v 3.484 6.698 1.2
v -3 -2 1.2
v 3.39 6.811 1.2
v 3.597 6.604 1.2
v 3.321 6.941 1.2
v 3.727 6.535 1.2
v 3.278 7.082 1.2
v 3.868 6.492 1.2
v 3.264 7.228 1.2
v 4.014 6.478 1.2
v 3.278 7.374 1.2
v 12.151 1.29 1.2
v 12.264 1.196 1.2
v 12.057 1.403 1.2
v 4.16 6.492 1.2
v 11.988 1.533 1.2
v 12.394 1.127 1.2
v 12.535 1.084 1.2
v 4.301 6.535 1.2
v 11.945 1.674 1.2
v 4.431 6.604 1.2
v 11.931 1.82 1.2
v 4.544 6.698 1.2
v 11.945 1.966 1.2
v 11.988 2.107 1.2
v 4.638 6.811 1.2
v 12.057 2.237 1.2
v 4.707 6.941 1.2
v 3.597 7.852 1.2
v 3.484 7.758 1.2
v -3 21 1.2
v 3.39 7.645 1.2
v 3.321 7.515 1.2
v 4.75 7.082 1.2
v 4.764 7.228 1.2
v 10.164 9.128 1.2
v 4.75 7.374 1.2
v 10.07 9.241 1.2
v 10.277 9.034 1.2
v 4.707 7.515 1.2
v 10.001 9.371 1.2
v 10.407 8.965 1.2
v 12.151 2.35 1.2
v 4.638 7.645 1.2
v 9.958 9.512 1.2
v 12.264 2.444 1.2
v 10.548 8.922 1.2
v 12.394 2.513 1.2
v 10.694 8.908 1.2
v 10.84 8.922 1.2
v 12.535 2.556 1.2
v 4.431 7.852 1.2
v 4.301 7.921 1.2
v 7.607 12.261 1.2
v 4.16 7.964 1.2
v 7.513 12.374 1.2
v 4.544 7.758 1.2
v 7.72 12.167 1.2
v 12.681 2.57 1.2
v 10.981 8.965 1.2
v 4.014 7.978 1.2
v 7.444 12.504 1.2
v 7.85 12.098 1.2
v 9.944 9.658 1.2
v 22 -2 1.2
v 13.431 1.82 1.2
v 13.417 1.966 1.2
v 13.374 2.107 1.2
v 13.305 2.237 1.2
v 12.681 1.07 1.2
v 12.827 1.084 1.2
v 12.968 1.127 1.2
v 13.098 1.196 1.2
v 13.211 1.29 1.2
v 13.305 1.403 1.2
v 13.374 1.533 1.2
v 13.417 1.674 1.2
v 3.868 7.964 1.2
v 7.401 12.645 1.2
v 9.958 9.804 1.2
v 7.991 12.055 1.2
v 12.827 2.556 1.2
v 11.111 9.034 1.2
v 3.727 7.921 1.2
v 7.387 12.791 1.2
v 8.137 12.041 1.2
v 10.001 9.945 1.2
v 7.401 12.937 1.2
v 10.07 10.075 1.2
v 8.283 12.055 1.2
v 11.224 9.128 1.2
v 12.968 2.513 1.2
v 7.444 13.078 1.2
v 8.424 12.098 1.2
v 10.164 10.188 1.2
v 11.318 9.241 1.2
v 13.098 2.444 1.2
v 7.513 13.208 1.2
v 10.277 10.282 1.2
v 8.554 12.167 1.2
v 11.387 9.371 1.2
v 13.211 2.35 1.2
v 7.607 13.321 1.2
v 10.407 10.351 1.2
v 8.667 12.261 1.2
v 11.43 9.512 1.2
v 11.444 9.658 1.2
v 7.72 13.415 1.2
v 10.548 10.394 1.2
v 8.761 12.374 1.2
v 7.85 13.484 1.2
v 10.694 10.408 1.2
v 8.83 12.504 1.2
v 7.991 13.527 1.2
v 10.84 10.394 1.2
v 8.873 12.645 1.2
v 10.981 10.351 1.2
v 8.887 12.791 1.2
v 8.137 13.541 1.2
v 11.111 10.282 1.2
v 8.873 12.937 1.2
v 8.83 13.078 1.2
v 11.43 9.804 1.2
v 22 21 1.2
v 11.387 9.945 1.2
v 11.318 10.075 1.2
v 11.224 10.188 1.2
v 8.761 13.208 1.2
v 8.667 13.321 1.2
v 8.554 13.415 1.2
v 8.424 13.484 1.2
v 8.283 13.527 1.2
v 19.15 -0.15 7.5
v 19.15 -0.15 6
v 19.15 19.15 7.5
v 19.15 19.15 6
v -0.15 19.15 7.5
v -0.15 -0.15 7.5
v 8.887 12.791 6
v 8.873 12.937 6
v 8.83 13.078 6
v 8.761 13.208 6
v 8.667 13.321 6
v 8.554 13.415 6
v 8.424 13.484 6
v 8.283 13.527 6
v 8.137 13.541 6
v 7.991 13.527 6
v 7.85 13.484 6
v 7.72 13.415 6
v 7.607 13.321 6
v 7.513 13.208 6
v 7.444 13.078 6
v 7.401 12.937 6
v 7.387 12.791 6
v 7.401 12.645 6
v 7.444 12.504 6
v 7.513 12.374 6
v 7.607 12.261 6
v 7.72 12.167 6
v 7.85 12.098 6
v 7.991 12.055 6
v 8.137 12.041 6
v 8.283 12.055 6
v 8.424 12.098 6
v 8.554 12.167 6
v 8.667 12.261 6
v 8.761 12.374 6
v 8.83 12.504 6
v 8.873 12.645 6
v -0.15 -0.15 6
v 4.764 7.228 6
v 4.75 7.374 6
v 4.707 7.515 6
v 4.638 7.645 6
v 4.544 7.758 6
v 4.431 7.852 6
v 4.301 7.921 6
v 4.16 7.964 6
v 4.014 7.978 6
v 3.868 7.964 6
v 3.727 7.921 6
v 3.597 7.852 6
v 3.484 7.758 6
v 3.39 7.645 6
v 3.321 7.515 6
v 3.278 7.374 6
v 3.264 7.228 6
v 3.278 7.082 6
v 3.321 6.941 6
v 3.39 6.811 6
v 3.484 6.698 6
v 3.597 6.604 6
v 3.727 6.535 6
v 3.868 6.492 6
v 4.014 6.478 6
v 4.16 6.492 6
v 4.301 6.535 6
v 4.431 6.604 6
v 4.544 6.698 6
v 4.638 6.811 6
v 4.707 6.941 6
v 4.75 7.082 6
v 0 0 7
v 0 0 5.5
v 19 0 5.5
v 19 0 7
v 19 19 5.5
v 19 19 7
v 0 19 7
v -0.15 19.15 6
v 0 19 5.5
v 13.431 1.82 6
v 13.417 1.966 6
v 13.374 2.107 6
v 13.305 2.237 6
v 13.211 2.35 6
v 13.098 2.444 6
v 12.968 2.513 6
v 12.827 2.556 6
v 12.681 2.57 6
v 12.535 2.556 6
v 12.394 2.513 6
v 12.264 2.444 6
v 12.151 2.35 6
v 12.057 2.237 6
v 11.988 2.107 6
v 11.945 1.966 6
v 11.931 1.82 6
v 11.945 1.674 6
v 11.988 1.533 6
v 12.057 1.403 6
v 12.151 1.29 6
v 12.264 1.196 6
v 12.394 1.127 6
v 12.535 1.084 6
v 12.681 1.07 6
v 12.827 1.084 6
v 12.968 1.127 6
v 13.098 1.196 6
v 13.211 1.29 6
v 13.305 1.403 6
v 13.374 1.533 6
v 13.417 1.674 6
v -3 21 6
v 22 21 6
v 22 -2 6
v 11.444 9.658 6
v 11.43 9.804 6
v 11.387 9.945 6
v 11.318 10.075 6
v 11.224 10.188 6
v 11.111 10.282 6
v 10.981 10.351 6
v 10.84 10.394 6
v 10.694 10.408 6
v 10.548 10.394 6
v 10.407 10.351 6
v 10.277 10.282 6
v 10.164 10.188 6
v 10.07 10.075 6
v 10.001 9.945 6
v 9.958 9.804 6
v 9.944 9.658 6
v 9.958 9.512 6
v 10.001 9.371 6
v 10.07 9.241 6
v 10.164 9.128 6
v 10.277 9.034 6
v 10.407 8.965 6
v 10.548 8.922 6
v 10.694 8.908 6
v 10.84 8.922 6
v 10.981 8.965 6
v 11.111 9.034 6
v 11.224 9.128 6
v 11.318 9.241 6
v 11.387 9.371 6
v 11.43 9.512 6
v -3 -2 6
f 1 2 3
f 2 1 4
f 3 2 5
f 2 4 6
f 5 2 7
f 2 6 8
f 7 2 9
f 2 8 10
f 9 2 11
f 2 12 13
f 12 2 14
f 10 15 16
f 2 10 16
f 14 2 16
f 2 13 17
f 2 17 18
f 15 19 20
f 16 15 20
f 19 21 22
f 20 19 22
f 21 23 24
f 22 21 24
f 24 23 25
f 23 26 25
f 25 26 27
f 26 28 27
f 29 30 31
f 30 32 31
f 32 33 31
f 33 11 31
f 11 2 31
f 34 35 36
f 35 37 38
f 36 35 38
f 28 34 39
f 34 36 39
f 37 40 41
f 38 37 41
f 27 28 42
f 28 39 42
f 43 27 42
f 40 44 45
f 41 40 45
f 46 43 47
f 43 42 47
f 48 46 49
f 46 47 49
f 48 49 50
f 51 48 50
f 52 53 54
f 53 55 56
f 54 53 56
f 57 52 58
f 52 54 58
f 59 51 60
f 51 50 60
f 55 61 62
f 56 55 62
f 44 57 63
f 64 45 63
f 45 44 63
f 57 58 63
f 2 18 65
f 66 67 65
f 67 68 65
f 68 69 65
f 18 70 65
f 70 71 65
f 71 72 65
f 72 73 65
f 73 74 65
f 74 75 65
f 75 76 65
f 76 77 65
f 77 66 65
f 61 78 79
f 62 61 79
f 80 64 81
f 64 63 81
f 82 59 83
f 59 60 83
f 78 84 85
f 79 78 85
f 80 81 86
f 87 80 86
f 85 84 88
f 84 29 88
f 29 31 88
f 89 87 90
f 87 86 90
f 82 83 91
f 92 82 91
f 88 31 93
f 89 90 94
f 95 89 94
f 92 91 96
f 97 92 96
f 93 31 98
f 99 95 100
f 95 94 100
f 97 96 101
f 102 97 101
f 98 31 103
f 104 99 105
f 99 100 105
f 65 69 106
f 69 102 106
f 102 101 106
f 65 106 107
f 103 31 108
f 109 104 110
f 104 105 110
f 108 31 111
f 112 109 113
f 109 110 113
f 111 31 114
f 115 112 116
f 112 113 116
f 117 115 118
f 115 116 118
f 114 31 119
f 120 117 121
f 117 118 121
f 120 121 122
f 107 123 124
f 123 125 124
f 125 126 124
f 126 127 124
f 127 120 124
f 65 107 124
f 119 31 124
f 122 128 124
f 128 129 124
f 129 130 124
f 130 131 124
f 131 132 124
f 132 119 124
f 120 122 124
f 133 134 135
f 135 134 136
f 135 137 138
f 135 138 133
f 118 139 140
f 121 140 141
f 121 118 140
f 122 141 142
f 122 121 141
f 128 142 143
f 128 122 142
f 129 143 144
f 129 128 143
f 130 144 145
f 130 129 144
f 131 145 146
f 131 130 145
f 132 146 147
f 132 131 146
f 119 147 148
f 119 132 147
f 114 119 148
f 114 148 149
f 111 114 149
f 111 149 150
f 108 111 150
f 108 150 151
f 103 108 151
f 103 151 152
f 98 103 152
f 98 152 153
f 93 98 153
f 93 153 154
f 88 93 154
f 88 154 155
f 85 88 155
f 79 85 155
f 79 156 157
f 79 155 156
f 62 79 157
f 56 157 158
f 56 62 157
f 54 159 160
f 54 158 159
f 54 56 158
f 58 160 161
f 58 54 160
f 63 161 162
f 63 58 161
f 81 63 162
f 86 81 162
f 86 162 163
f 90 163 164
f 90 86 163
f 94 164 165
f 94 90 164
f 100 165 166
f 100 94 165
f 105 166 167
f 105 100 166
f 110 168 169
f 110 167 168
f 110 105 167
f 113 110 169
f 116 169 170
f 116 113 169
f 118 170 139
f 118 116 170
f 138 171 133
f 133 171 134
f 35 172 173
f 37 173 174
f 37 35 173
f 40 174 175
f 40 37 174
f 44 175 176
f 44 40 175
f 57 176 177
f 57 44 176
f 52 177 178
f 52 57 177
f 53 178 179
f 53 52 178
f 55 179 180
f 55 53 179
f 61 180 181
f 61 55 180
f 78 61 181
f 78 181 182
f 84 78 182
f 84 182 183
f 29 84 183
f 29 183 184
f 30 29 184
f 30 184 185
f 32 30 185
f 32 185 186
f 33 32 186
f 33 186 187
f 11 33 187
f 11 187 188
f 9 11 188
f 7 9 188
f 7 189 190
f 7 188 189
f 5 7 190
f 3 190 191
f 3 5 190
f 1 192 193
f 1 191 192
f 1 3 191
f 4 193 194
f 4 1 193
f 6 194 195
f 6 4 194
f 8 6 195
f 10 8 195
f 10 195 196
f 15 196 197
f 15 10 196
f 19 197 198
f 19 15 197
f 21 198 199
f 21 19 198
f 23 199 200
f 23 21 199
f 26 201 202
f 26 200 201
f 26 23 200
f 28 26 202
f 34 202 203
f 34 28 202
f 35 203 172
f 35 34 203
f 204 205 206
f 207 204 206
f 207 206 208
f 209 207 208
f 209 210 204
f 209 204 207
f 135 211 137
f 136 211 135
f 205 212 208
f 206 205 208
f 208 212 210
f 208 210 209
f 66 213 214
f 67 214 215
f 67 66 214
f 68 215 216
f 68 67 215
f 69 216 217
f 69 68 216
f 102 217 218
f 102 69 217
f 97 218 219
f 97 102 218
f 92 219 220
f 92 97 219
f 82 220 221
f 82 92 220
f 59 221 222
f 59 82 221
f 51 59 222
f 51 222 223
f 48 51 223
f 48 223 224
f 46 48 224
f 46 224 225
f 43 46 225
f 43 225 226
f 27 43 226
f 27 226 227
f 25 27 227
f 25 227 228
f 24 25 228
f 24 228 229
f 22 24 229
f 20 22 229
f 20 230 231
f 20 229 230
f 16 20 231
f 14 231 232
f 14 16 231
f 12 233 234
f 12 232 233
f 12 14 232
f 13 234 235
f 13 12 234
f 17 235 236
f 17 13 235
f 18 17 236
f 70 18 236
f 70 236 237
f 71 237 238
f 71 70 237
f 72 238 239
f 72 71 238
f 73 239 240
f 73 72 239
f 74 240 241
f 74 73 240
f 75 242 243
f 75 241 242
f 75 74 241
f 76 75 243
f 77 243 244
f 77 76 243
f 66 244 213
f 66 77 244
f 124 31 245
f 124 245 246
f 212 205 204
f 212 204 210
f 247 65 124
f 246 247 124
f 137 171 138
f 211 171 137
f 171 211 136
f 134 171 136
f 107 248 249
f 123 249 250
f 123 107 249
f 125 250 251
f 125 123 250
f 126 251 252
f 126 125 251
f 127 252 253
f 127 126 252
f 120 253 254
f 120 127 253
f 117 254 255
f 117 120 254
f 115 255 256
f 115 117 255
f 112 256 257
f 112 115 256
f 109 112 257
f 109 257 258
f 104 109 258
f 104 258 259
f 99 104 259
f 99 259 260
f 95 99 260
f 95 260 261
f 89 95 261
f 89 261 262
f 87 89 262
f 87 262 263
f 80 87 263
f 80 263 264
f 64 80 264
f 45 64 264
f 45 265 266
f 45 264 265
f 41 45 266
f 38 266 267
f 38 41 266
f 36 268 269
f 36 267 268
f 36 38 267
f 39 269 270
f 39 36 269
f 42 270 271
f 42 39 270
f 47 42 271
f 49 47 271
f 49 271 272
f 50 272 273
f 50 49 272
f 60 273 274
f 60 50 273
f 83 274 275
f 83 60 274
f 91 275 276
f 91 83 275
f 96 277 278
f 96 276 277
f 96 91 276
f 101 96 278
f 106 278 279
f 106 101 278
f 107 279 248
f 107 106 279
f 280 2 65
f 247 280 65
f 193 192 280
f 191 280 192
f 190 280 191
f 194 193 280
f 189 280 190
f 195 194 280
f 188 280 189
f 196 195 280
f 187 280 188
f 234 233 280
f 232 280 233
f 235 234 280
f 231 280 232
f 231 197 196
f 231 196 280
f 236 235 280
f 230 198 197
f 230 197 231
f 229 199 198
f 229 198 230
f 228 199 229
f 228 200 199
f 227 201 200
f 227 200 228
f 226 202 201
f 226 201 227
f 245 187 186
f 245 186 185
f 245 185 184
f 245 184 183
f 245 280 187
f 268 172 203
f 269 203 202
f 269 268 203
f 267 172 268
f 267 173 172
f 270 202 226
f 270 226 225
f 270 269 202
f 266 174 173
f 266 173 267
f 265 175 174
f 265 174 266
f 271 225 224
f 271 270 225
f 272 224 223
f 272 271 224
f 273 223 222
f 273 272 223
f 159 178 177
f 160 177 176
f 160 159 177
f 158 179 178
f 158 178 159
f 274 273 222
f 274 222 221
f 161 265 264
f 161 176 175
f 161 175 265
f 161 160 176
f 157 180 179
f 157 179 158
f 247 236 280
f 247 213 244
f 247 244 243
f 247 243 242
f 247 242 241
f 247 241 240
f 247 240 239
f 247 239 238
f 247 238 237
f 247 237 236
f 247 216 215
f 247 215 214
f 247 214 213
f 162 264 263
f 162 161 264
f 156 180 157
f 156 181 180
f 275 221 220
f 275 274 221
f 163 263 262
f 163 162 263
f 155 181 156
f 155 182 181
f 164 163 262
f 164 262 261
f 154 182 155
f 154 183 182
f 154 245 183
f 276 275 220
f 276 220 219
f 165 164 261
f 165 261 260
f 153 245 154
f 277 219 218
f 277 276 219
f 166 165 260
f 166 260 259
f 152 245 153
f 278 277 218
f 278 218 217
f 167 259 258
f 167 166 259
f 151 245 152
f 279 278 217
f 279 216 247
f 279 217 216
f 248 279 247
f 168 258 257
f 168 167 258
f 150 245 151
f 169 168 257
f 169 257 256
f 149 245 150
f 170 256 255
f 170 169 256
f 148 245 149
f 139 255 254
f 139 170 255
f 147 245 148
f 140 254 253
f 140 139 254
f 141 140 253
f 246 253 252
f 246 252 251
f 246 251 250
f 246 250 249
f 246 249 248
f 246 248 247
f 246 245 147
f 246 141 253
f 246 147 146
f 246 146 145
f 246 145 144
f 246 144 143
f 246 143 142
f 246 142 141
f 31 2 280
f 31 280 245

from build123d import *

# Parameters (mm, degrees)
BOX_W             = 19
BOX_H             = 19
BOX_DEPTH         = 1.5
BOX001_W          = 19.3
BOX001_H          = 19.3
BOX001_DEPTH      = 1.5
CYLINDER003_R     = 0.75
CYLINDER003_DEPTH = 5.8
CYLINDER001_R     = 0.75
CYLINDER001_DEPTH = 5.8
CYLINDER002_R     = 0.75
CYLINDER002_DEPTH = 5.8
CYLINDER_R        = 0.75
CYLINDER_DEPTH    = 5.8
BOX002_W          = 25
BOX002_H          = 23
BOX002_DEPTH      = 4.8


with BuildPart() as board:
    # Box → Box (new body)
    with BuildSketch(Plane.XY.offset(5.5)):
        with Locations((9.5, 9.5)):
            Rectangle(BOX_W, BOX_H)
    extrude(amount=BOX_DEPTH)


with BuildPart() as board_hole:
    # Box001 → Box001 (new body)
    with BuildSketch(Plane(origin=(-0.15, -0.15, 6), x_dir=(1, 0, 0), z_dir=(0, 0, 1))):
        with Locations((9.65, 9.65)):
            Rectangle(BOX001_W, BOX001_H)
    extrude(amount=BOX001_DEPTH)


with BuildPart() as cylinder003:
    # Cylinder003 → Cylinder003 (new body)
    with BuildSketch(Plane(origin=(12.681, 1.82, 1.2), x_dir=(1, 0, 0), z_dir=(0, 0, 1))):
        Circle(CYLINDER003_R)
    extrude(amount=CYLINDER003_DEPTH)


with BuildPart() as cylinder001:
    # Cylinder001 → Cylinder001 (new body)
    with BuildSketch(Plane(origin=(10.694, 9.658, 1.2), x_dir=(1, 0, 0), z_dir=(0, 0, 1))):
        Circle(CYLINDER001_R)
    extrude(amount=CYLINDER001_DEPTH)


with BuildPart() as cylinder002:
    # Cylinder002 → Cylinder002 (new body)
    with BuildSketch(Plane(origin=(4.014, 7.228, 1.2), x_dir=(1, 0, 0), z_dir=(0, 0, 1))):
        Circle(CYLINDER002_R)
    extrude(amount=CYLINDER002_DEPTH)


with BuildPart() as fusion:
    # Cylinder → Cylinder (new body)
    with BuildSketch(Plane(origin=(8.137, 12.791, 1.2), x_dir=(1, 0, 0), z_dir=(0, 0, 1))):
        Circle(CYLINDER_R)
    extrude(amount=CYLINDER_DEPTH)

    # Fusion: union Cylinder003, Cylinder001, Cylinder002
    add(cylinder003.part)
    add(cylinder001.part)
    add(cylinder002.part)


with BuildPart() as cut:
    # Box002 → Box002 (new body)
    with BuildSketch(Plane(origin=(-3, -2, 1.2), x_dir=(1, 0, 0), z_dir=(0, 0, 1))):
        with Locations((12.5, 11.5)):
            Rectangle(BOX002_W, BOX002_H)
    extrude(amount=BOX002_DEPTH)

    # Cut: cut Fusion
    add(fusion.part, mode=Mode.SUBTRACT)


solid = Compound([board.part, board_hole.part, cut.part])
